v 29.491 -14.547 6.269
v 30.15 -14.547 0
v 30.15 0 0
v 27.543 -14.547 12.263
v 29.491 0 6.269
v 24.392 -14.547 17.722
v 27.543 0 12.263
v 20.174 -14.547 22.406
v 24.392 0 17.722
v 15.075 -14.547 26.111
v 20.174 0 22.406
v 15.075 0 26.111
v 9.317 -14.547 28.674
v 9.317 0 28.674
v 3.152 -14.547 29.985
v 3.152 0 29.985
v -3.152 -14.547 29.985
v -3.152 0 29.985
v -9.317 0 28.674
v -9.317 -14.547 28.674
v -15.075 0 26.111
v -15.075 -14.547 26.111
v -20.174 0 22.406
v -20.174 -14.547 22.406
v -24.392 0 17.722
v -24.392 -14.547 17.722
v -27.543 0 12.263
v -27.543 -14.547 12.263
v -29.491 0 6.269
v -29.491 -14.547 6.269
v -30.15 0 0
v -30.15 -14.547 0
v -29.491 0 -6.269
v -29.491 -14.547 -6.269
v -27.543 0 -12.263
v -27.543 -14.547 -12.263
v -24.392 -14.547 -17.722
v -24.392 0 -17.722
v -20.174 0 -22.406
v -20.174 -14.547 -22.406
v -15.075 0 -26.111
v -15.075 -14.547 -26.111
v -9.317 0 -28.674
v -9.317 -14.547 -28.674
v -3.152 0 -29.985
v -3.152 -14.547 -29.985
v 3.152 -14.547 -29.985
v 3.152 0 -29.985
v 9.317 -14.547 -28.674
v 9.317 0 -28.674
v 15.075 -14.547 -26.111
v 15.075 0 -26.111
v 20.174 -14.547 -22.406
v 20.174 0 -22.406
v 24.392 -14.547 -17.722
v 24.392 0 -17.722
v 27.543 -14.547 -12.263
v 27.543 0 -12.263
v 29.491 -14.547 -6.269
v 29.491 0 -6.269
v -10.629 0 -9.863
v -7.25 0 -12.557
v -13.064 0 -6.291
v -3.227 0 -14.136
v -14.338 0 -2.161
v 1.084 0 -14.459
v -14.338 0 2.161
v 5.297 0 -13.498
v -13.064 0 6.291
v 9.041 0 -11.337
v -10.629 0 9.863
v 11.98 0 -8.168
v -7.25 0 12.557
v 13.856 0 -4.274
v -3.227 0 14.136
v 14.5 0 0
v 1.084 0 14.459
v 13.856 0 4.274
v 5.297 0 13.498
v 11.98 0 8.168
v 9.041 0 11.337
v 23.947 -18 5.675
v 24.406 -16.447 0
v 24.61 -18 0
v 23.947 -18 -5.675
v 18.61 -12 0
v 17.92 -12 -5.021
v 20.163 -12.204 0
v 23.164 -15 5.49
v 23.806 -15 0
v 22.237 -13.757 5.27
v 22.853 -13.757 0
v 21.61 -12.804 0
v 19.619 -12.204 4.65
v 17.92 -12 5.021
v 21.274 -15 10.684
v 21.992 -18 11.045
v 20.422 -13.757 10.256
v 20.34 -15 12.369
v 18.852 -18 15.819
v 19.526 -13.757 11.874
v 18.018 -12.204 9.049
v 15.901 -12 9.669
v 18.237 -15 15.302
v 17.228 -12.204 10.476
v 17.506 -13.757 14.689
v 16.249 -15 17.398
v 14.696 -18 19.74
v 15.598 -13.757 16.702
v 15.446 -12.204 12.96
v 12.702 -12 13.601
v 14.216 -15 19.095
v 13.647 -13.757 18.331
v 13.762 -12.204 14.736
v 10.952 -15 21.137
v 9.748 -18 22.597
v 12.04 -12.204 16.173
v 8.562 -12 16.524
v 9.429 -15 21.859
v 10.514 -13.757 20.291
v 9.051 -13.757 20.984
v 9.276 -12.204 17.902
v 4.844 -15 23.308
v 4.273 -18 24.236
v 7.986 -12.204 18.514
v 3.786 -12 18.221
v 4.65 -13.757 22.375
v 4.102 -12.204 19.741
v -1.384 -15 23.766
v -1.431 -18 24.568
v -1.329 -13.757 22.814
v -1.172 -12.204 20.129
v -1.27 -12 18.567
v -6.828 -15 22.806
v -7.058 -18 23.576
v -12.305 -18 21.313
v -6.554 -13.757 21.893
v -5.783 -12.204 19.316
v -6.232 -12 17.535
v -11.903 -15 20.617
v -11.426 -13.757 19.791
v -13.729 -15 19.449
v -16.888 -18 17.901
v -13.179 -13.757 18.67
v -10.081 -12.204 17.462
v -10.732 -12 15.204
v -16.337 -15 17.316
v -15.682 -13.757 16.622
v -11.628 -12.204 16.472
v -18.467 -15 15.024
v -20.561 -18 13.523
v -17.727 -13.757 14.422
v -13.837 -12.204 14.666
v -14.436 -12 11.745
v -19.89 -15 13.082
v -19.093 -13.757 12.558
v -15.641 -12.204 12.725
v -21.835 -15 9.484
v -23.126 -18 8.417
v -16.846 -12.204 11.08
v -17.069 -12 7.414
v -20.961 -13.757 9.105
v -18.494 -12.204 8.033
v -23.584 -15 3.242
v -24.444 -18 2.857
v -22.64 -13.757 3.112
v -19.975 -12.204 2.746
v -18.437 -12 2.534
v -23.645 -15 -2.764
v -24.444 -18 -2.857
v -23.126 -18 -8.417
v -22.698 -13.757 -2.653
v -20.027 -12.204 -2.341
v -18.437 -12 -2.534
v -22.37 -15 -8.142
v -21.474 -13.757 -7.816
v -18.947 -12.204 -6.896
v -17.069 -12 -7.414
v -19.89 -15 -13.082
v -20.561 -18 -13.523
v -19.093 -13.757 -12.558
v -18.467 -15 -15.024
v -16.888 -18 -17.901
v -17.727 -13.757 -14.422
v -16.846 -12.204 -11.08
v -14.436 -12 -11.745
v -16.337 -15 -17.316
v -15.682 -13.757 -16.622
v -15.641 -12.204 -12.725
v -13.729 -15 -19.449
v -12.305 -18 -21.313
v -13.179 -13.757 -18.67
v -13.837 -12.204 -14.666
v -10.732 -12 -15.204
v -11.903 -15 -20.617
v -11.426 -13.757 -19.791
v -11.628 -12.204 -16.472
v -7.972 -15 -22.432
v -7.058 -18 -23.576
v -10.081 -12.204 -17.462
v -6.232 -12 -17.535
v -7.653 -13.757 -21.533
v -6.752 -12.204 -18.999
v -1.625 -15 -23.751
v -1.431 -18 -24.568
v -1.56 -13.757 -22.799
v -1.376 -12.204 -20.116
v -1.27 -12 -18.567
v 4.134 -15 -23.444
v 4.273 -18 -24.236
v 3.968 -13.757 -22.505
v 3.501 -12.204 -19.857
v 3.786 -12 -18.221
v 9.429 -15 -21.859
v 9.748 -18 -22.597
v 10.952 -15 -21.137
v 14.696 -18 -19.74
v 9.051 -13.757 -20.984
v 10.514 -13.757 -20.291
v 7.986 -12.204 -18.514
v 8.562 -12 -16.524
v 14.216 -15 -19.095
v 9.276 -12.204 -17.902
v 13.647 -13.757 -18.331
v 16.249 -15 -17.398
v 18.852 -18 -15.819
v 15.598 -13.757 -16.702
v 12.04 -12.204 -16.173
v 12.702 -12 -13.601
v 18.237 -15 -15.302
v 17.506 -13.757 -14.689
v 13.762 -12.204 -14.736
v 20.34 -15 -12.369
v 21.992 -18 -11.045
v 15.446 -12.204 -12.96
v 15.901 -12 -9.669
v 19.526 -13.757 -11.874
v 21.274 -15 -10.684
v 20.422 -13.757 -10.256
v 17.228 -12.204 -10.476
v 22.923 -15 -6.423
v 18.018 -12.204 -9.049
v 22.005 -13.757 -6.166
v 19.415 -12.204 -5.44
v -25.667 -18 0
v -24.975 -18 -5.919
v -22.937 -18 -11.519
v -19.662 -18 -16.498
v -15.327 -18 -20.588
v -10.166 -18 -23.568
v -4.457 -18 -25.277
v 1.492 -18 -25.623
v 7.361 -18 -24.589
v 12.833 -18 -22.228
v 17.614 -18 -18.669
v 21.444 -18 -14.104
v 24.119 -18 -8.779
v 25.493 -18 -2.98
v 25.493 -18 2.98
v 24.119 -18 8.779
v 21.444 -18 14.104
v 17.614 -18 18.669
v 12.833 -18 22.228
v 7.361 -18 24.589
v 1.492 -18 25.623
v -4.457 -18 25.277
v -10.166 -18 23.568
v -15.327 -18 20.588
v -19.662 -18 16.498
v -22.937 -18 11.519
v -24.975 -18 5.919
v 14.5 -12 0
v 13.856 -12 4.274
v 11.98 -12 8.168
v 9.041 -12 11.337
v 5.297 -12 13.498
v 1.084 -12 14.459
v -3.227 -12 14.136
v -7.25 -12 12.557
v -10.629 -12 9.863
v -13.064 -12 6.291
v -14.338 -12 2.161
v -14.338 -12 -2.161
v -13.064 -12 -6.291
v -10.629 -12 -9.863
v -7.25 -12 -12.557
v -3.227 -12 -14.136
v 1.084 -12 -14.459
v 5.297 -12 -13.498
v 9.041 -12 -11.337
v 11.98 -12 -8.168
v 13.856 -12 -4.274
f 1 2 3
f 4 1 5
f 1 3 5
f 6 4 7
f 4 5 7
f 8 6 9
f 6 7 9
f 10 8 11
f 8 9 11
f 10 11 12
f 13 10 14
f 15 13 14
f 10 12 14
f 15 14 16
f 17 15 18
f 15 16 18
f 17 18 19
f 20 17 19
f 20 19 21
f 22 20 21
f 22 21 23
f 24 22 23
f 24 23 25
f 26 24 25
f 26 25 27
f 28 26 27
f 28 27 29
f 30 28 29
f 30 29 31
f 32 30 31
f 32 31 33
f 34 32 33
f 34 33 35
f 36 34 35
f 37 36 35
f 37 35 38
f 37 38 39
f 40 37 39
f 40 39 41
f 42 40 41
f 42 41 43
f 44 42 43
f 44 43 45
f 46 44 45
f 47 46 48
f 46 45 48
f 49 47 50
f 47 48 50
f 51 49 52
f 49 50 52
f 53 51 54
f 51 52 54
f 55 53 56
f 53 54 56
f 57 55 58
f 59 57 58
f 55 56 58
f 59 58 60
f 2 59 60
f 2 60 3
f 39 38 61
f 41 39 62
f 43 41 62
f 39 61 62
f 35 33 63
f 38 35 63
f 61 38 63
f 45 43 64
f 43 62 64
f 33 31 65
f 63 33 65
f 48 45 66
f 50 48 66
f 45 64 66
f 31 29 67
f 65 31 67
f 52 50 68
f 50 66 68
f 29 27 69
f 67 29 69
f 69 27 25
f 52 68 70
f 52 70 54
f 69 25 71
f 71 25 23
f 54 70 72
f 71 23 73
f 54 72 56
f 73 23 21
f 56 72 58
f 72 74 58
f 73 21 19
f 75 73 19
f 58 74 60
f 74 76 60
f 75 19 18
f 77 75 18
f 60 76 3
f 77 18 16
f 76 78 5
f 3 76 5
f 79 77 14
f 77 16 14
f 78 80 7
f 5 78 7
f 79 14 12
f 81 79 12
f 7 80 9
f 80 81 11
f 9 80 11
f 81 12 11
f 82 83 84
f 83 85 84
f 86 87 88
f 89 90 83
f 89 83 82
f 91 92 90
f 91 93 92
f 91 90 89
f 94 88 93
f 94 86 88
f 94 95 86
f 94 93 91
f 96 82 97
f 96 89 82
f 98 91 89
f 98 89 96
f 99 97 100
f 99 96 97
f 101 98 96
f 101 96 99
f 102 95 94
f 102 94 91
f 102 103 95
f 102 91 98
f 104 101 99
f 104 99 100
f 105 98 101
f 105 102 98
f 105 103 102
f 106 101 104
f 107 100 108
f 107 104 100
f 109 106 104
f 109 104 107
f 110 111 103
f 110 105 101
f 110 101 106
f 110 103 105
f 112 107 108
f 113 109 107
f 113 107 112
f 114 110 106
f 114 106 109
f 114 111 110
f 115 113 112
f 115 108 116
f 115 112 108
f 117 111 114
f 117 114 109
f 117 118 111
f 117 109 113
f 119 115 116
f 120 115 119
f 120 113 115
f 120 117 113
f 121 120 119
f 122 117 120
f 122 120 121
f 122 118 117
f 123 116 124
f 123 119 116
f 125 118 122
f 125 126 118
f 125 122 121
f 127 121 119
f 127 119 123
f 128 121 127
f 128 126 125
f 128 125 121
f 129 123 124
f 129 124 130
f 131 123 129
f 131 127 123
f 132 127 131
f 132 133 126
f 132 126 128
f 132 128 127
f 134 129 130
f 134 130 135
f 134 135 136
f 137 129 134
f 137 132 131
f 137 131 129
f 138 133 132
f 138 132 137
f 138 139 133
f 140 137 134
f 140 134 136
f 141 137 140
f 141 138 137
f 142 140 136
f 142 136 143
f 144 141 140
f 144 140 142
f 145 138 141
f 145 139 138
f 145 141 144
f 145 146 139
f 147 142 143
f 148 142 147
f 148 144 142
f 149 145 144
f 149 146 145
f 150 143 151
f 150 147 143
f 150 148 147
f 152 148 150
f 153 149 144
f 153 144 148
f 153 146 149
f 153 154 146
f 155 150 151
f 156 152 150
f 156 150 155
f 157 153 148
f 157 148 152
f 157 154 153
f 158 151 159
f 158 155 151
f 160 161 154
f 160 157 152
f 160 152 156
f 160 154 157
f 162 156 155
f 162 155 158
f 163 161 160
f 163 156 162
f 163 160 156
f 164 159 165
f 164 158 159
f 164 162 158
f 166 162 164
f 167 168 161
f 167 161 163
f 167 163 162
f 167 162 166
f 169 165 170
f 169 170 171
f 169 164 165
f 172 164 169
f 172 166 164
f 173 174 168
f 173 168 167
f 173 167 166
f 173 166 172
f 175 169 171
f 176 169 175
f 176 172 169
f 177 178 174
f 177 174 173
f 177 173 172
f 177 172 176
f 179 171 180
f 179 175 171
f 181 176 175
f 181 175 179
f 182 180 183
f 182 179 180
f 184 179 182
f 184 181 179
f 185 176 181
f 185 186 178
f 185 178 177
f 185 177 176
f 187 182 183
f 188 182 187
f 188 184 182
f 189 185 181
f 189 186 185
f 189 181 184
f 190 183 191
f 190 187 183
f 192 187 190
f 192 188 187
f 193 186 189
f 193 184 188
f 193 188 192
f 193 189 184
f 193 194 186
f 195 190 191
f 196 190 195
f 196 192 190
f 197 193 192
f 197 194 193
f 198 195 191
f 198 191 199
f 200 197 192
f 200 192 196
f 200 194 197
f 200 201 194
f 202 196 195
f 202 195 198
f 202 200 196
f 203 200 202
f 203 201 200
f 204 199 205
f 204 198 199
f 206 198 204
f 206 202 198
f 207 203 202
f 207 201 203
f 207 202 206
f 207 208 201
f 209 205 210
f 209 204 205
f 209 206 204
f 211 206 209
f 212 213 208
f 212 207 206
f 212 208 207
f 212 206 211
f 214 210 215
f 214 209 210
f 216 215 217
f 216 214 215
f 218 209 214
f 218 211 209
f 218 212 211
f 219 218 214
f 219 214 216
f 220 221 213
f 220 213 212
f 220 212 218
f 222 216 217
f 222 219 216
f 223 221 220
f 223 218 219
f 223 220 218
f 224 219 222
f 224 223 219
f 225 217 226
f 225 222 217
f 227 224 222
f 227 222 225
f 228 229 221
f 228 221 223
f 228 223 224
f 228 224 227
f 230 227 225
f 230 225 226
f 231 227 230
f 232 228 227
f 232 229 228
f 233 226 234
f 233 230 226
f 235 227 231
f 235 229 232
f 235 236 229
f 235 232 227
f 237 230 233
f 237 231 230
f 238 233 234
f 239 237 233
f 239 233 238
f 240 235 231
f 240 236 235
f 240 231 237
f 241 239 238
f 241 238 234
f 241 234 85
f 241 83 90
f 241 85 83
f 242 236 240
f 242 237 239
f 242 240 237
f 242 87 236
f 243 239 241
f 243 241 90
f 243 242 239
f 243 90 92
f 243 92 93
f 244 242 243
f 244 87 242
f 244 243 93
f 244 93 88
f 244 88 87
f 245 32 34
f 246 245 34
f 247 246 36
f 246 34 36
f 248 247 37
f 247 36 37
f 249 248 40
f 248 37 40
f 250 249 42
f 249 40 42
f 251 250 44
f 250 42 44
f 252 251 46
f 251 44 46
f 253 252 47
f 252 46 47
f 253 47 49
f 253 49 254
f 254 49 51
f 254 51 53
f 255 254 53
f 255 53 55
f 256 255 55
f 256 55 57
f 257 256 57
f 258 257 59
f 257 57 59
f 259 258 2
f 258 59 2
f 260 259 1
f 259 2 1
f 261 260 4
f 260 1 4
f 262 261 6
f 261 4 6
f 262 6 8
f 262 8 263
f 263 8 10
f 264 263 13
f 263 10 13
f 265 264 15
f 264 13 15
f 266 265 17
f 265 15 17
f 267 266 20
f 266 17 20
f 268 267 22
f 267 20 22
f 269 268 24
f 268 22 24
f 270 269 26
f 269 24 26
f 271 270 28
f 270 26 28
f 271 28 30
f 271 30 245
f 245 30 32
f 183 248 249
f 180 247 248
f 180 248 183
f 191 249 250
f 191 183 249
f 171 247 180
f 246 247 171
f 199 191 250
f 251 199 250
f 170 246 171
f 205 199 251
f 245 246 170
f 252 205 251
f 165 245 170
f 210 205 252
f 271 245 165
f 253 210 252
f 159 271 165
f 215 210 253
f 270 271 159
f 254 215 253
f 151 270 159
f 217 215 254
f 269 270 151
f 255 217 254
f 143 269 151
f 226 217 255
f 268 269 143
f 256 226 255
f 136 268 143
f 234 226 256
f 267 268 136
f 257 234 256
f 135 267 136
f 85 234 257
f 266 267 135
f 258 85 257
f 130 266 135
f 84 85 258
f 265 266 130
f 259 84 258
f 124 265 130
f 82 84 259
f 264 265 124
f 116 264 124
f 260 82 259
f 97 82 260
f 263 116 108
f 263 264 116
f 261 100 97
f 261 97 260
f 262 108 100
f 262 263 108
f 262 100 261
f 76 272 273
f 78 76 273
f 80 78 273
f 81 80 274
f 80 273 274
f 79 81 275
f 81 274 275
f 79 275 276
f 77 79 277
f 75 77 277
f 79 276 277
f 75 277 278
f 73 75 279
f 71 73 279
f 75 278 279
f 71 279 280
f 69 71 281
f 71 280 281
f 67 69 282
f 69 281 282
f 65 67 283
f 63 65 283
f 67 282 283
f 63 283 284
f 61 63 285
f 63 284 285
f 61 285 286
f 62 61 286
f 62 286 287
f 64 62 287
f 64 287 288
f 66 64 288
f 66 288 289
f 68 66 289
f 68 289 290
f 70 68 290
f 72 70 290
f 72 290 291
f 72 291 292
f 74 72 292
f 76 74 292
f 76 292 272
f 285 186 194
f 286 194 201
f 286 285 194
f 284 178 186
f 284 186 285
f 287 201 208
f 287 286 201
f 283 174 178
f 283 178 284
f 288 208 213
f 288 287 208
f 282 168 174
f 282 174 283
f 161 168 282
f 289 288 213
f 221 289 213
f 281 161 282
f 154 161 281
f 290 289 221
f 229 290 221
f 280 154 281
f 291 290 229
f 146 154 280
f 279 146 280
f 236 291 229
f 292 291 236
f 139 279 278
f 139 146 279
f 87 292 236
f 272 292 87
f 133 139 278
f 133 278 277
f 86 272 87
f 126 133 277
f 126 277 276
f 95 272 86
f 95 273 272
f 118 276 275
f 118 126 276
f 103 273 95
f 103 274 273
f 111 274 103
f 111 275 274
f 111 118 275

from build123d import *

# Parameters (mm, degrees)
F0_R     = 30.15
F1_DEPTH = 18
F2_R     = 24.61
F3_DEPTH = 6
F4_R     = 5.99999
F5_R     = 14.5
F6_DEPTH = 25


# Not quite as in the source:
# - a fillet or chamfer is up to 0.001 mm smaller than in the source, because OpenCascade refuses the exact size


with BuildPart() as f1:
    # F0 (on Front) → F1 (new body)
    with BuildSketch(Plane.XZ):
        Circle(F0_R)
    extrude(amount=F1_DEPTH)

    # F2 (on face) → F3 (cut)
    with BuildSketch(Plane.XZ.offset(18)):
        Circle(F2_R)
    extrude(amount=-F3_DEPTH, mode=Mode.SUBTRACT)

    # F4 (radius 6 in the source; OpenCascade refuses exactly that, so slightly less here)
    f4_edges = [f1.edges().sort_by_distance(p)[0] for p in [
        (-24.61, -12, 0),
    ]]
    fillet(f4_edges, radius=F4_R)

    # F5 (on face) → F6 (cut)
    with BuildSketch(Plane.XZ.offset(12)):
        Circle(F5_R)
    extrude(amount=-F6_DEPTH, mode=Mode.SUBTRACT)

    # F7 (on Top) → F8 (revolve, cut)
    with BuildSketch(Plane.XY):
        Polygon((-30.15, -18), (-25.6668464834, -18), (-30.15, -14.5470285541), align=None)
    revolve(axis=Axis((0, -2.2485724185, 0), (0, -1, 0)), mode=Mode.SUBTRACT)


solid = f1.part
